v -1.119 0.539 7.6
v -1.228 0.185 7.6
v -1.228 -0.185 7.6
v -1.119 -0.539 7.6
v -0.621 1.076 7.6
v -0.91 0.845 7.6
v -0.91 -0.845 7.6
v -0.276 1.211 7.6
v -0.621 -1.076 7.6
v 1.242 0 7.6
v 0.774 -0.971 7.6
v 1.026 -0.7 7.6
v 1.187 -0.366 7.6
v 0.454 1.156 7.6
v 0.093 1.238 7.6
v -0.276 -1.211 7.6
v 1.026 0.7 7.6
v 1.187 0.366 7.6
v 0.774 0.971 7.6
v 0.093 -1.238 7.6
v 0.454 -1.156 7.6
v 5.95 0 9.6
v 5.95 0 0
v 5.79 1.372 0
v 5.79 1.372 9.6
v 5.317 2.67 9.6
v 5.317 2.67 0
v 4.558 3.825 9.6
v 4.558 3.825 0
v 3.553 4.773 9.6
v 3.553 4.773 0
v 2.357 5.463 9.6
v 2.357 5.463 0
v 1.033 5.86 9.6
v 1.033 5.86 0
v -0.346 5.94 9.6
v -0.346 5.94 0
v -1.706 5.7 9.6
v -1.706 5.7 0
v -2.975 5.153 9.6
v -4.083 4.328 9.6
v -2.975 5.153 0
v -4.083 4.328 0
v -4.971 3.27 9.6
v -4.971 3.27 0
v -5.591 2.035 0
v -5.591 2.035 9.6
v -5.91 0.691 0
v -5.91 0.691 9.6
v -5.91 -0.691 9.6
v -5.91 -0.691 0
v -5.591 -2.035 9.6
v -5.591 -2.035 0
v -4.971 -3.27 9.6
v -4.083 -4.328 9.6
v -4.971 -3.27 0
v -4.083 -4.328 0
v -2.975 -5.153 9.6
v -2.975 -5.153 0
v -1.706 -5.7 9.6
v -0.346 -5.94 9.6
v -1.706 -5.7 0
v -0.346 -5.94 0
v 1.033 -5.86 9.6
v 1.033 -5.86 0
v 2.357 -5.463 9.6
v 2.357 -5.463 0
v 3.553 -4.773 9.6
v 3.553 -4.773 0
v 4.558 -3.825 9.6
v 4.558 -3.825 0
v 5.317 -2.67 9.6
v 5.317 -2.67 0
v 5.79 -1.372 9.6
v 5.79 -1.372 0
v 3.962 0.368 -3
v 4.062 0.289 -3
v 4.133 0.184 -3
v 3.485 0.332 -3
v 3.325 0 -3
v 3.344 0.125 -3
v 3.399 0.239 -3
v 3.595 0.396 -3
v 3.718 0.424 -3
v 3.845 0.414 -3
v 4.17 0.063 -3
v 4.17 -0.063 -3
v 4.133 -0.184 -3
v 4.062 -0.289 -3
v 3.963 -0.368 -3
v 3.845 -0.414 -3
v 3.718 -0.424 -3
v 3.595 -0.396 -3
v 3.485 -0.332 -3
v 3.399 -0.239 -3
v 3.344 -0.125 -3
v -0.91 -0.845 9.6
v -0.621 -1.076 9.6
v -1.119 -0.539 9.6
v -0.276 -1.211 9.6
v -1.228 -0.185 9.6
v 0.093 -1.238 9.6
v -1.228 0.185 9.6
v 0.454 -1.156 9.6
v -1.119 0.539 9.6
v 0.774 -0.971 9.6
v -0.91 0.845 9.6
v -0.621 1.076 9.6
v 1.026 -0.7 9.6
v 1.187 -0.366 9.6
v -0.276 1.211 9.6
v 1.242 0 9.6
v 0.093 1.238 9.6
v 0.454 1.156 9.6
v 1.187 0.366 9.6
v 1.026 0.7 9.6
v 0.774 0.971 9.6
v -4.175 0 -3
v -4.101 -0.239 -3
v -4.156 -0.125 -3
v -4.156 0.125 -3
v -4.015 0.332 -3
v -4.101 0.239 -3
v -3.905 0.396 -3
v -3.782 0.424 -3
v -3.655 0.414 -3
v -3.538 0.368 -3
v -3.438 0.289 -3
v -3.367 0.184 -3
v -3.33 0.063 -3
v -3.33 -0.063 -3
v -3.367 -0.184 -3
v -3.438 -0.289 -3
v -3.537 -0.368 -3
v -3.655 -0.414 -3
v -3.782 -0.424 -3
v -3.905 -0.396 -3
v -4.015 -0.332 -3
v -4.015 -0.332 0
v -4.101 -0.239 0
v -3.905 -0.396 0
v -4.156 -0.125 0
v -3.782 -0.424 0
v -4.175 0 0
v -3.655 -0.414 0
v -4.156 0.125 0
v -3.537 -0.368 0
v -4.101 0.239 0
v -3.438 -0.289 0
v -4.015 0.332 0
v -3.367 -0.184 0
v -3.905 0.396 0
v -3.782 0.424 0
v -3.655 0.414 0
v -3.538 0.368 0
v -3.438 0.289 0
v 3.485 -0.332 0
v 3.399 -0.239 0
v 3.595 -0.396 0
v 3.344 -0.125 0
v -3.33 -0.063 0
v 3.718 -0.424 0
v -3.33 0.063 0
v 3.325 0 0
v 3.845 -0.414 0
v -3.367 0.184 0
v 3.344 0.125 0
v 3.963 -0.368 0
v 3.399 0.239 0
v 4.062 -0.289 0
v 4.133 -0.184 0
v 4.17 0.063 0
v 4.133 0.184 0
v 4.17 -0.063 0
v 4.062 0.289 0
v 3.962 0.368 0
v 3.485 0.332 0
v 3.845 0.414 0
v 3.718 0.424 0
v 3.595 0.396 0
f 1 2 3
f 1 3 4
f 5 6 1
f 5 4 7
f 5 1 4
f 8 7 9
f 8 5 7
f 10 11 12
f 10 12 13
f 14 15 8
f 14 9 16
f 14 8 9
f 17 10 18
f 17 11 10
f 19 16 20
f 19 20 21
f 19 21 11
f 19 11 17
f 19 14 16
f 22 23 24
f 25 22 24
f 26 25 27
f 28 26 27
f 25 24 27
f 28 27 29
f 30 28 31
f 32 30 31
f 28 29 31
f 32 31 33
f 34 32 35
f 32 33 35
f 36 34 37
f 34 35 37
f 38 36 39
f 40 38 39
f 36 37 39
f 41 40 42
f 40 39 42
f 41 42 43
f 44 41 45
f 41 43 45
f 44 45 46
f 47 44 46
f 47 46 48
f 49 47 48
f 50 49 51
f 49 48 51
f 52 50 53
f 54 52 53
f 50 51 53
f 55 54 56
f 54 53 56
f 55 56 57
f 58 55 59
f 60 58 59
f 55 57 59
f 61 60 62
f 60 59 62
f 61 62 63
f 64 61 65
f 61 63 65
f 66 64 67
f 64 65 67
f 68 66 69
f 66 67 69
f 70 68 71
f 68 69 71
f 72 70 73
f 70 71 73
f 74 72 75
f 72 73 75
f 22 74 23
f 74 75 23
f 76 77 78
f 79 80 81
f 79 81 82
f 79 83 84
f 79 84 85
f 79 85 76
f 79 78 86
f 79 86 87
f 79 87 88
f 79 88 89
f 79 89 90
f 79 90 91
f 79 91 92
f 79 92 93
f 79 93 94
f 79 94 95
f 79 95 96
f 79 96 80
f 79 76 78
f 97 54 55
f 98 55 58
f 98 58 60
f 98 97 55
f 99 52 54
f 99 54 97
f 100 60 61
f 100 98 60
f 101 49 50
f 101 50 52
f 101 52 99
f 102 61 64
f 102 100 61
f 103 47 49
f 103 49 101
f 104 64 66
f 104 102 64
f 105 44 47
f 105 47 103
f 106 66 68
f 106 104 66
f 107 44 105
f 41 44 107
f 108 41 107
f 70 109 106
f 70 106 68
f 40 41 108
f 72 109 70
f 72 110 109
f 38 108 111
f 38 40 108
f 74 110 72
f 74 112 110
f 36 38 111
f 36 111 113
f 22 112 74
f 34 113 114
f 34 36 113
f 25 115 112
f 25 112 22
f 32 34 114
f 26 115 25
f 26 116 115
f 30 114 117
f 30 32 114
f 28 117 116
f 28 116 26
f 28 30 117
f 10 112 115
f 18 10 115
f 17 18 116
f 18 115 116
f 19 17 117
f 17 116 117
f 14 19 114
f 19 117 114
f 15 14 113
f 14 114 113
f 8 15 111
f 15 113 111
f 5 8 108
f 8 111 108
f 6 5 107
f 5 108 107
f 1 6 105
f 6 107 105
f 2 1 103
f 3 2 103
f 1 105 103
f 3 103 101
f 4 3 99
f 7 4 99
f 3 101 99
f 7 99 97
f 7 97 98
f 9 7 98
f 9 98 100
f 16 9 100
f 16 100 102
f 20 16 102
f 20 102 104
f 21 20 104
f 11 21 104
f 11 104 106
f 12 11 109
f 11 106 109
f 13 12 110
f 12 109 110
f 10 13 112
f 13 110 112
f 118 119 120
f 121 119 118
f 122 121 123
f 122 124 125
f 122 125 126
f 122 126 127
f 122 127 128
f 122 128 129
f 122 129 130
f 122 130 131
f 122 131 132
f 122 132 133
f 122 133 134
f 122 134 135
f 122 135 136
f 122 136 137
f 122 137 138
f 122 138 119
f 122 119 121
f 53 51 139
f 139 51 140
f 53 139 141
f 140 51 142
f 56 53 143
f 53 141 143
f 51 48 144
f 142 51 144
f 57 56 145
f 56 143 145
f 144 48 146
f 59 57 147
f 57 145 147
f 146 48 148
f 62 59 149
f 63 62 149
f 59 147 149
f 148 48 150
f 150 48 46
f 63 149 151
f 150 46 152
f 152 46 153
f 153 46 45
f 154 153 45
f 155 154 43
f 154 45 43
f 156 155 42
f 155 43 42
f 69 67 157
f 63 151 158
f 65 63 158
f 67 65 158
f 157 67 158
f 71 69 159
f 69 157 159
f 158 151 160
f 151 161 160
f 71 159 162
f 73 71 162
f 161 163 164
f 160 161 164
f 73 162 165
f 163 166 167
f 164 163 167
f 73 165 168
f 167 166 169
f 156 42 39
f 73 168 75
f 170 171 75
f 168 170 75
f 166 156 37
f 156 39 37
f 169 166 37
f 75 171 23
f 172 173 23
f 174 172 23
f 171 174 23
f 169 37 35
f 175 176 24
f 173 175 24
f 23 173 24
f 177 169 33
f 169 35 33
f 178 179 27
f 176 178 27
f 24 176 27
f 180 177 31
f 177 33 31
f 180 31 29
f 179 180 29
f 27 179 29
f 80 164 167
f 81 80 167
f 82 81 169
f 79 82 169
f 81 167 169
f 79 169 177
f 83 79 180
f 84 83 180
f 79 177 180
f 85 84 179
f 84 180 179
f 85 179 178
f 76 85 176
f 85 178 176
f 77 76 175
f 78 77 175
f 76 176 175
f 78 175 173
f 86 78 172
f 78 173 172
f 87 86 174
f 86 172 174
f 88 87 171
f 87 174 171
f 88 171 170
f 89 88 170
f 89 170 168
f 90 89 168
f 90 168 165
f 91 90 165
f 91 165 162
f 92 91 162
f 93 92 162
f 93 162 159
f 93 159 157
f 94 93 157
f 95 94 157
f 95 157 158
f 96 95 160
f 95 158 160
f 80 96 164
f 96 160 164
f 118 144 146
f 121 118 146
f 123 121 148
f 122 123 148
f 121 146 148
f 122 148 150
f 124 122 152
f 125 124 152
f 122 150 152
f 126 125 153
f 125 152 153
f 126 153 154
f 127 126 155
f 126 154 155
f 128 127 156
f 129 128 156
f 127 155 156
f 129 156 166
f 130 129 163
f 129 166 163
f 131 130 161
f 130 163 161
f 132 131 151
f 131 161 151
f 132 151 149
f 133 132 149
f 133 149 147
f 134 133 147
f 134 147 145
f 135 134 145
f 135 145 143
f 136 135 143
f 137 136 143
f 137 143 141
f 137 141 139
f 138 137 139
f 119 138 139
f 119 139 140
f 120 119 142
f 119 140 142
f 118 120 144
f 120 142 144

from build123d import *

# Parameters (mm, degrees)
SKETCH1_R           = 5.95
BOSS_EXTRUDE1_DEPTH = 9.6
SKETCH2_R           = 1.241958451
CUT_EXTRUDE1_DEPTH  = 2
SKETCH3_R           = 0.425
BOSS_EXTRUDE2_DEPTH = 3


with BuildPart() as part:
    # Sketch1 → Boss-Extrude1 (new body)
    with BuildSketch(Plane.XY):
        Circle(SKETCH1_R)
    extrude(amount=BOSS_EXTRUDE1_DEPTH)

    # Sketch2 → Cut-Extrude1 (cut)
    with BuildSketch(Plane.XY.offset(9.6)):
        Circle(SKETCH2_R)
    extrude(amount=-CUT_EXTRUDE1_DEPTH, mode=Mode.SUBTRACT)

    # Sketch3 → Boss-Extrude2 (add)
    with BuildSketch(Plane(origin=(0, 0, 0), x_dir=(-1, 0, 0), z_dir=(0, 0, -1))):
        with Locations((-3.75, 0)):
            Circle(SKETCH3_R)
        with Locations((3.75, 0)):
            Circle(SKETCH3_R)
    extrude(amount=BOSS_EXTRUDE2_DEPTH)


solid = part.part
